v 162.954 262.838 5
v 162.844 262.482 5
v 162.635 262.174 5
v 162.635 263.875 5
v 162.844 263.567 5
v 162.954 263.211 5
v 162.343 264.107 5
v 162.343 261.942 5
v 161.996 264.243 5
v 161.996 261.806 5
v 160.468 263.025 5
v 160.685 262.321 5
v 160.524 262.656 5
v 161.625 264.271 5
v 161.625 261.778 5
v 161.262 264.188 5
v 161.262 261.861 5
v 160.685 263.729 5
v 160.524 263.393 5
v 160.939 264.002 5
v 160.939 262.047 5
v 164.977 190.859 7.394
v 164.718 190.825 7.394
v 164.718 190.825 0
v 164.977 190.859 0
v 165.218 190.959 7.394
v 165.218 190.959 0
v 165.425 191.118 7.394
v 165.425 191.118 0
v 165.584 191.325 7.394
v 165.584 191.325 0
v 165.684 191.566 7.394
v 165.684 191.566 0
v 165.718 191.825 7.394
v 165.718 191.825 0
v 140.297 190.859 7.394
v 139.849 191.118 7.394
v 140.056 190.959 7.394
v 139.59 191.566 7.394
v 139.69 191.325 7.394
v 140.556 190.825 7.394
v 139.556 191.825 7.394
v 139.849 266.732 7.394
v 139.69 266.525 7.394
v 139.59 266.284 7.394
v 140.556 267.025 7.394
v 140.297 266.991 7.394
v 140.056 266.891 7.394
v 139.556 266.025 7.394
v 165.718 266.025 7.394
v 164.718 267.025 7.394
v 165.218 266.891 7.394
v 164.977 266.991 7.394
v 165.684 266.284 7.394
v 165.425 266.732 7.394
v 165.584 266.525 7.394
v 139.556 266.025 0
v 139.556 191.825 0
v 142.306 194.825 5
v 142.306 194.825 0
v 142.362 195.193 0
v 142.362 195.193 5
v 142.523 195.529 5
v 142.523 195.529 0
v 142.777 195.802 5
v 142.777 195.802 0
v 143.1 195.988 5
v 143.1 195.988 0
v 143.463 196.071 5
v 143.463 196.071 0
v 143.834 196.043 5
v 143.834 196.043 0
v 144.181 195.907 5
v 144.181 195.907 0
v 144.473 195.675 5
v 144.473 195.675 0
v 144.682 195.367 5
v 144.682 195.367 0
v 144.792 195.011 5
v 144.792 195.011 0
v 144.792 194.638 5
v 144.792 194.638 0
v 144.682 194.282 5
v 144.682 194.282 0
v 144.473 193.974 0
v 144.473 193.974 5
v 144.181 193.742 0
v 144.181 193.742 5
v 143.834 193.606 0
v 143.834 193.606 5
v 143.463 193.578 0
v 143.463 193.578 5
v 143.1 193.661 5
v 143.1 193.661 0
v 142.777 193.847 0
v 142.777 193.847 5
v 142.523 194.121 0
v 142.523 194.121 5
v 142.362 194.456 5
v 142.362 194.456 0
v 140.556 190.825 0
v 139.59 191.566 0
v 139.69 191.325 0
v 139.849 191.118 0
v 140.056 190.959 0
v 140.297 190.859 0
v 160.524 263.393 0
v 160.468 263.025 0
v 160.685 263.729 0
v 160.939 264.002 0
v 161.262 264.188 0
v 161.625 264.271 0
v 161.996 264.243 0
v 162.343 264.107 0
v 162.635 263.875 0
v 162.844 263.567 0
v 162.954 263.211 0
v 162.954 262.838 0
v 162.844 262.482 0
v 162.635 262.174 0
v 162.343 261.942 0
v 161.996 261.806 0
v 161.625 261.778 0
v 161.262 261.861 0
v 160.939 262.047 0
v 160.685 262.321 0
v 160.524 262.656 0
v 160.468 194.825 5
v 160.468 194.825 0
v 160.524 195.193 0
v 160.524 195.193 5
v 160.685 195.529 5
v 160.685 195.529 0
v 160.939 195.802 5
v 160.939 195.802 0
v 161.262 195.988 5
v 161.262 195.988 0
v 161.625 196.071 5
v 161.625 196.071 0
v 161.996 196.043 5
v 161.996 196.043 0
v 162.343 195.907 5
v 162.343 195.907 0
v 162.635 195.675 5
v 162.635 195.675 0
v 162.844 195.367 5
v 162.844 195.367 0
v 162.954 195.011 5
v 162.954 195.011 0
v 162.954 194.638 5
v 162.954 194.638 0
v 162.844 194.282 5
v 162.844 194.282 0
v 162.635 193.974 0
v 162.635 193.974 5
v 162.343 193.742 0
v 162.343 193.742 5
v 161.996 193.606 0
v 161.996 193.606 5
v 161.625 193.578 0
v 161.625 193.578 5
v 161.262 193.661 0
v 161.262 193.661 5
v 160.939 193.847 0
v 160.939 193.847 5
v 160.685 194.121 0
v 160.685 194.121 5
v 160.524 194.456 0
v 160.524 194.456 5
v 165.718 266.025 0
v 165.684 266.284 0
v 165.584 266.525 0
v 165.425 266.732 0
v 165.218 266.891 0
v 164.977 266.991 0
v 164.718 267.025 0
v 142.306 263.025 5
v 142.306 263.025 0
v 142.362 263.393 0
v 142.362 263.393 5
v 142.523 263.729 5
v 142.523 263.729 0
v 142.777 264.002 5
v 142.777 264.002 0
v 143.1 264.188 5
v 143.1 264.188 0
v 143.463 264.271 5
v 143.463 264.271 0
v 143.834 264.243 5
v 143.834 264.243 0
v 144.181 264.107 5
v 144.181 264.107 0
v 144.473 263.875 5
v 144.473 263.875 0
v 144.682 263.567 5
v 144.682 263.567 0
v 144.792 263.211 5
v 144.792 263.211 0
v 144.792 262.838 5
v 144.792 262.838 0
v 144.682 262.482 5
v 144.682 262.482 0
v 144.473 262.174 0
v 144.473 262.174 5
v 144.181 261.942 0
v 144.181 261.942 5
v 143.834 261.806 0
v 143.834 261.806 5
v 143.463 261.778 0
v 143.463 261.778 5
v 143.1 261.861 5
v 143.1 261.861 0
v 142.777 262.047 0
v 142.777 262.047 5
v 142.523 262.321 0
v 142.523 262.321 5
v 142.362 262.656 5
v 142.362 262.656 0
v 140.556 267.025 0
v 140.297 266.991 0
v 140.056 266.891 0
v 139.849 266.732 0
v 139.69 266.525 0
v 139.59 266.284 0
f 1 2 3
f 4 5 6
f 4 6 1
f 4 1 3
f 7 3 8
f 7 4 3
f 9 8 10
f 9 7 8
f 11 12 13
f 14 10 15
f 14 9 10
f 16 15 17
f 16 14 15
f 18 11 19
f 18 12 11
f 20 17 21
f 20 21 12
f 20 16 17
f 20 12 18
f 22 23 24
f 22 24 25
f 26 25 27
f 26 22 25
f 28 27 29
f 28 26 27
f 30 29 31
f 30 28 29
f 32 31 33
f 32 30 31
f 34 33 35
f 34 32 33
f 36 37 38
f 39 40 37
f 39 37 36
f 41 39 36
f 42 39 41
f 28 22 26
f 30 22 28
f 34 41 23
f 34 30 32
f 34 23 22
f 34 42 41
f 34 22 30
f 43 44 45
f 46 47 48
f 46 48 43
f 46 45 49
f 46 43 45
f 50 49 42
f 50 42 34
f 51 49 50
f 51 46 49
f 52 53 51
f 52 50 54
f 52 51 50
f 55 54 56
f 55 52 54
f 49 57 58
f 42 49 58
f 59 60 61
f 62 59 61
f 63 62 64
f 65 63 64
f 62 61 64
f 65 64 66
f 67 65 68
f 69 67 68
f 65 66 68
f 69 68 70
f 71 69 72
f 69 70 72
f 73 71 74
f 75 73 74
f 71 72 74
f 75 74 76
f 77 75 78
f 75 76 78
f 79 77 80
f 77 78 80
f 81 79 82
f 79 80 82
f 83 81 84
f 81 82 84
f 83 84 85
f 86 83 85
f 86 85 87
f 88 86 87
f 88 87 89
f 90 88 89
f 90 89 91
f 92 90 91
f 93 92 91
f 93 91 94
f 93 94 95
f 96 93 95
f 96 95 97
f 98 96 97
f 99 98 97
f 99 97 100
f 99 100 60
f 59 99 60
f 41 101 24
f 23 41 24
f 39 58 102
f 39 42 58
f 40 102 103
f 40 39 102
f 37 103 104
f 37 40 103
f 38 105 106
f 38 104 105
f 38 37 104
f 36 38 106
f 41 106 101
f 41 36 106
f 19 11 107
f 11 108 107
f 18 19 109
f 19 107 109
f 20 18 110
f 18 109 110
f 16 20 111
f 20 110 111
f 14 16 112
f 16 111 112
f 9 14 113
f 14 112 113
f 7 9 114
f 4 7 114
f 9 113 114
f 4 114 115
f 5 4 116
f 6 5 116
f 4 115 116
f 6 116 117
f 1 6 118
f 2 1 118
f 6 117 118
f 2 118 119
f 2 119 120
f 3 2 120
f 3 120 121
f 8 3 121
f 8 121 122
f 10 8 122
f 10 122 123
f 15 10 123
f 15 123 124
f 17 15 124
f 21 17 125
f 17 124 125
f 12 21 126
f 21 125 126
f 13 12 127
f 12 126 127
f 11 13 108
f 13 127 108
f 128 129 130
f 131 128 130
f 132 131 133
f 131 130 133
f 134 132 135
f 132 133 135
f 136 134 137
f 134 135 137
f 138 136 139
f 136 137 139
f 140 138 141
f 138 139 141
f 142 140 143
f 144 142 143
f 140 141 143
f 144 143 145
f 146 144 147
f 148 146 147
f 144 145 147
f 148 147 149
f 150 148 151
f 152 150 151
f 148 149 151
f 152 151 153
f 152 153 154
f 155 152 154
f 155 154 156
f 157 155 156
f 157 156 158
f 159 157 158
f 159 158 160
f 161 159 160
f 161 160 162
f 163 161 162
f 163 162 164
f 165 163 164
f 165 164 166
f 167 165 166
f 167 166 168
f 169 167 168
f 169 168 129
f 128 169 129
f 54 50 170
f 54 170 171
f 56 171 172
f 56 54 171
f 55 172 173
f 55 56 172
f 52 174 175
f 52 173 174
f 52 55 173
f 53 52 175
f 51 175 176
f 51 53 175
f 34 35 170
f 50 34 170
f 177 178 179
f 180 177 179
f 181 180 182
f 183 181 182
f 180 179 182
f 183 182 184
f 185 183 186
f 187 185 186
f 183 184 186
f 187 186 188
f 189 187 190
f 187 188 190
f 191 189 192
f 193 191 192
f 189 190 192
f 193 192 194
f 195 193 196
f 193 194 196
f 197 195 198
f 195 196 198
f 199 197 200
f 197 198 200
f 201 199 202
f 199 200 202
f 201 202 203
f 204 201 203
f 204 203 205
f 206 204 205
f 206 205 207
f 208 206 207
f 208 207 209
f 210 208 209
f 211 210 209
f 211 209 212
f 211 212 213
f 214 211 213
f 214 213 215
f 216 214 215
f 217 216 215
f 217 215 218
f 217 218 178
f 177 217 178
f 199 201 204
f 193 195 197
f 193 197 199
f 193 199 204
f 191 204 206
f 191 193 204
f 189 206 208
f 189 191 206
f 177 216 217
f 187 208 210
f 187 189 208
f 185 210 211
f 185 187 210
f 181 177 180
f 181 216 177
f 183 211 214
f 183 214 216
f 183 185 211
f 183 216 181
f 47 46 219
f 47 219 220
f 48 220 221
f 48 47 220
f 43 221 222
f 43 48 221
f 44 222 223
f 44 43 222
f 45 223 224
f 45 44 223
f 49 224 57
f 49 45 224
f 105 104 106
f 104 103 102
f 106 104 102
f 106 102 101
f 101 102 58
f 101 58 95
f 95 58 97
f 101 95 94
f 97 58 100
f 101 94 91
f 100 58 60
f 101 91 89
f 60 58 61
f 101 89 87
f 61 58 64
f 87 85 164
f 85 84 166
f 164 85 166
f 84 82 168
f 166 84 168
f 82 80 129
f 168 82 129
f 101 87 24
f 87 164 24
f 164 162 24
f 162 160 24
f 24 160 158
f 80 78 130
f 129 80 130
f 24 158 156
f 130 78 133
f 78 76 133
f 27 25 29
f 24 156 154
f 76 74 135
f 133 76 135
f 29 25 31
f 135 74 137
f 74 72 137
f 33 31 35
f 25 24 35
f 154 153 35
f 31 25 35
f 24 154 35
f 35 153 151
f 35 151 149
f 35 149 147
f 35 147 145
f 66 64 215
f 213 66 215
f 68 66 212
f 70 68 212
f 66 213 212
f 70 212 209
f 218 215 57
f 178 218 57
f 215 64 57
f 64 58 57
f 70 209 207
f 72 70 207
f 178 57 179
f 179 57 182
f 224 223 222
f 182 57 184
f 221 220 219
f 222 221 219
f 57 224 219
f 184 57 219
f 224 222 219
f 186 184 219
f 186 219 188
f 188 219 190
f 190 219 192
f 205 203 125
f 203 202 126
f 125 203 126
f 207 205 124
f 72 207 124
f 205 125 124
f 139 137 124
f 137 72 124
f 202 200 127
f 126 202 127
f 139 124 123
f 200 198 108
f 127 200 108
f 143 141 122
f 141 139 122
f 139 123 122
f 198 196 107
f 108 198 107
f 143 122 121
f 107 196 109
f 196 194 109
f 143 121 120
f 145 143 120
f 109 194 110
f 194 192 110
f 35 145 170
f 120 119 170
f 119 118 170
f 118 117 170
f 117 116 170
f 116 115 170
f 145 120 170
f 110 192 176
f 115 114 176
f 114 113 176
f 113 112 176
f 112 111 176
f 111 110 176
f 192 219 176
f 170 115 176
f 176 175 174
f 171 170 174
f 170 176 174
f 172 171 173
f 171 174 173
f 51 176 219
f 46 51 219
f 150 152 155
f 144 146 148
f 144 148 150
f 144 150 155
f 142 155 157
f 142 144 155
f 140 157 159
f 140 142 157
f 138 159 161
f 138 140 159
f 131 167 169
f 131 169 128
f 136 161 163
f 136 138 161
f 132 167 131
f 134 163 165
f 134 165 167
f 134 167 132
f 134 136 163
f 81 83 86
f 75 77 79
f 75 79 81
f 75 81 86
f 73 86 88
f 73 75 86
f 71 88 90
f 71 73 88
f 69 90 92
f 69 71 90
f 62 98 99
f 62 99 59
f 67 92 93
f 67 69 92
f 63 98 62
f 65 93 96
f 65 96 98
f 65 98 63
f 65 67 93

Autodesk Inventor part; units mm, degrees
ref_plane "YZ Plane" through (0, 0, 0) normal (1, 0, 0) x (0, 1, 0)
ref_plane "XZ Plane" through (0, 0, 0) normal (0, 1, 0) x (-1, 0, 0)
sketch "Sketch1" plane through (0, 0, 0) normal (0, 0, 1) x (1, 0, 0)
  line L0 (165.7182, 252.0837) -> (146.6642, 252.0837) projected
  line L1 (158.6327, 216.5237) -> (165.7182, 216.5237) projected
  line L2 (139.5562, 216.5237) -> (143.6242, 216.5237) projected
  line L3 (143.6242, 252.0837) -> (139.5562, 252.0837) projected
  line L4 (126.4117, 267.0247) -> (136.1907, 267.0247) projected
  line L5 (136.1907, 190.8247) -> (126.4117, 190.8247) projected
  line L6 (139.5562, 267.0247) -> (139.5562, 190.8247)
  line L7 (139.5562, 190.8247) -> (165.7182, 190.8247)
  line L8 (165.7182, 190.8247) -> (165.7182, 267.0247)
  line L9 (165.7182, 267.0247) -> (139.5562, 267.0247)
  point P0 (0, 0)
ref_plane "Work Plane1" through (146.6642, 216.5237, 7.3936) normal (0, 0, -1) x (0, 1, 0)
extrude "Extrusion1" add sketch "Sketch1" along normal up to surface (7.3936 mm away)
fillet "Fillet1" radius 1 4 edges at (139.5562, 190.8247, 3.6968) (139.5562, 267.0247, 3.6968) (165.7182, 267.0247, 3.6968) (165.7182, 190.8247, 3.6968)
sketch "Sketch3" plane through (0, 0, 0) normal (0, 0, -1) x (-1, 0, 0)
  circle A0 centre (-160.3842, 185.8247) radius 1.25
  line L0 (-165.7182, 191.8247) -> (-165.7182, 194.8247)
  line L1 (-165.7182, 191.8247) -> (-165.7182, 266.0247) projected
  line L2 (-165.7182, 194.8247) -> (-161.7182, 194.8247)
  circle A1 centre (-161.7182, 194.8247) radius 1.25
  line L3 (-140.5562, 190.8247) -> (-164.7182, 190.8247) projected
  line L4 (-165.7182, 228.9247) -> (-156.0588, 228.9247)
  line L5 (-152.6372, 190.8247) -> (-152.6372, 206.7203)
  line L6 (-139.5562, 191.8247) -> (-139.5562, 194.8247)
  line L7 (-139.5562, 191.8247) -> (-139.5562, 266.0247)
  line L8 (-139.5562, 194.8247) -> (-143.5562, 194.8247)
  circle A2 centre (-143.5562, 194.8247) radius 1.25
  line L9 (-164.7182, 190.8247) -> (-140.5562, 190.8247)
  circle A3 centre (-160.3842, 272.0247) radius 1.25
  line L10 (-165.7182, 266.0247) -> (-165.7182, 263.0247)
  line L11 (-165.7182, 266.0247) -> (-165.7182, 191.8247)
  line L12 (-165.7182, 263.0247) -> (-161.7182, 263.0247)
  circle A4 centre (-161.7182, 263.0247) radius 1.25
  line L13 (-140.5562, 267.0247) -> (-164.7182, 267.0247)
  line L14 (-152.6372, 267.0247) -> (-152.6372, 251.1291)
  line L15 (-139.5562, 266.0247) -> (-139.5562, 263.0247)
  line L16 (-139.5562, 266.0247) -> (-139.5562, 191.8247)
  line L17 (-139.5562, 263.0247) -> (-143.5562, 263.0247)
  circle A5 centre (-143.5562, 263.0247) radius 1.25
  line L18 (-164.7182, 267.0247) -> (-140.5562, 267.0247)
  point P0 (0, 0)
  dimension "d11" = 3
  dimension "d12" = 4
  dimension "d13" = 2.5
  dimension "d14" = 4
extrude "Extrusion3" cut sketch "Sketch3" against normal blind 5 contours A4 | A1 | A5 | A2
properties part number "Supporter"
